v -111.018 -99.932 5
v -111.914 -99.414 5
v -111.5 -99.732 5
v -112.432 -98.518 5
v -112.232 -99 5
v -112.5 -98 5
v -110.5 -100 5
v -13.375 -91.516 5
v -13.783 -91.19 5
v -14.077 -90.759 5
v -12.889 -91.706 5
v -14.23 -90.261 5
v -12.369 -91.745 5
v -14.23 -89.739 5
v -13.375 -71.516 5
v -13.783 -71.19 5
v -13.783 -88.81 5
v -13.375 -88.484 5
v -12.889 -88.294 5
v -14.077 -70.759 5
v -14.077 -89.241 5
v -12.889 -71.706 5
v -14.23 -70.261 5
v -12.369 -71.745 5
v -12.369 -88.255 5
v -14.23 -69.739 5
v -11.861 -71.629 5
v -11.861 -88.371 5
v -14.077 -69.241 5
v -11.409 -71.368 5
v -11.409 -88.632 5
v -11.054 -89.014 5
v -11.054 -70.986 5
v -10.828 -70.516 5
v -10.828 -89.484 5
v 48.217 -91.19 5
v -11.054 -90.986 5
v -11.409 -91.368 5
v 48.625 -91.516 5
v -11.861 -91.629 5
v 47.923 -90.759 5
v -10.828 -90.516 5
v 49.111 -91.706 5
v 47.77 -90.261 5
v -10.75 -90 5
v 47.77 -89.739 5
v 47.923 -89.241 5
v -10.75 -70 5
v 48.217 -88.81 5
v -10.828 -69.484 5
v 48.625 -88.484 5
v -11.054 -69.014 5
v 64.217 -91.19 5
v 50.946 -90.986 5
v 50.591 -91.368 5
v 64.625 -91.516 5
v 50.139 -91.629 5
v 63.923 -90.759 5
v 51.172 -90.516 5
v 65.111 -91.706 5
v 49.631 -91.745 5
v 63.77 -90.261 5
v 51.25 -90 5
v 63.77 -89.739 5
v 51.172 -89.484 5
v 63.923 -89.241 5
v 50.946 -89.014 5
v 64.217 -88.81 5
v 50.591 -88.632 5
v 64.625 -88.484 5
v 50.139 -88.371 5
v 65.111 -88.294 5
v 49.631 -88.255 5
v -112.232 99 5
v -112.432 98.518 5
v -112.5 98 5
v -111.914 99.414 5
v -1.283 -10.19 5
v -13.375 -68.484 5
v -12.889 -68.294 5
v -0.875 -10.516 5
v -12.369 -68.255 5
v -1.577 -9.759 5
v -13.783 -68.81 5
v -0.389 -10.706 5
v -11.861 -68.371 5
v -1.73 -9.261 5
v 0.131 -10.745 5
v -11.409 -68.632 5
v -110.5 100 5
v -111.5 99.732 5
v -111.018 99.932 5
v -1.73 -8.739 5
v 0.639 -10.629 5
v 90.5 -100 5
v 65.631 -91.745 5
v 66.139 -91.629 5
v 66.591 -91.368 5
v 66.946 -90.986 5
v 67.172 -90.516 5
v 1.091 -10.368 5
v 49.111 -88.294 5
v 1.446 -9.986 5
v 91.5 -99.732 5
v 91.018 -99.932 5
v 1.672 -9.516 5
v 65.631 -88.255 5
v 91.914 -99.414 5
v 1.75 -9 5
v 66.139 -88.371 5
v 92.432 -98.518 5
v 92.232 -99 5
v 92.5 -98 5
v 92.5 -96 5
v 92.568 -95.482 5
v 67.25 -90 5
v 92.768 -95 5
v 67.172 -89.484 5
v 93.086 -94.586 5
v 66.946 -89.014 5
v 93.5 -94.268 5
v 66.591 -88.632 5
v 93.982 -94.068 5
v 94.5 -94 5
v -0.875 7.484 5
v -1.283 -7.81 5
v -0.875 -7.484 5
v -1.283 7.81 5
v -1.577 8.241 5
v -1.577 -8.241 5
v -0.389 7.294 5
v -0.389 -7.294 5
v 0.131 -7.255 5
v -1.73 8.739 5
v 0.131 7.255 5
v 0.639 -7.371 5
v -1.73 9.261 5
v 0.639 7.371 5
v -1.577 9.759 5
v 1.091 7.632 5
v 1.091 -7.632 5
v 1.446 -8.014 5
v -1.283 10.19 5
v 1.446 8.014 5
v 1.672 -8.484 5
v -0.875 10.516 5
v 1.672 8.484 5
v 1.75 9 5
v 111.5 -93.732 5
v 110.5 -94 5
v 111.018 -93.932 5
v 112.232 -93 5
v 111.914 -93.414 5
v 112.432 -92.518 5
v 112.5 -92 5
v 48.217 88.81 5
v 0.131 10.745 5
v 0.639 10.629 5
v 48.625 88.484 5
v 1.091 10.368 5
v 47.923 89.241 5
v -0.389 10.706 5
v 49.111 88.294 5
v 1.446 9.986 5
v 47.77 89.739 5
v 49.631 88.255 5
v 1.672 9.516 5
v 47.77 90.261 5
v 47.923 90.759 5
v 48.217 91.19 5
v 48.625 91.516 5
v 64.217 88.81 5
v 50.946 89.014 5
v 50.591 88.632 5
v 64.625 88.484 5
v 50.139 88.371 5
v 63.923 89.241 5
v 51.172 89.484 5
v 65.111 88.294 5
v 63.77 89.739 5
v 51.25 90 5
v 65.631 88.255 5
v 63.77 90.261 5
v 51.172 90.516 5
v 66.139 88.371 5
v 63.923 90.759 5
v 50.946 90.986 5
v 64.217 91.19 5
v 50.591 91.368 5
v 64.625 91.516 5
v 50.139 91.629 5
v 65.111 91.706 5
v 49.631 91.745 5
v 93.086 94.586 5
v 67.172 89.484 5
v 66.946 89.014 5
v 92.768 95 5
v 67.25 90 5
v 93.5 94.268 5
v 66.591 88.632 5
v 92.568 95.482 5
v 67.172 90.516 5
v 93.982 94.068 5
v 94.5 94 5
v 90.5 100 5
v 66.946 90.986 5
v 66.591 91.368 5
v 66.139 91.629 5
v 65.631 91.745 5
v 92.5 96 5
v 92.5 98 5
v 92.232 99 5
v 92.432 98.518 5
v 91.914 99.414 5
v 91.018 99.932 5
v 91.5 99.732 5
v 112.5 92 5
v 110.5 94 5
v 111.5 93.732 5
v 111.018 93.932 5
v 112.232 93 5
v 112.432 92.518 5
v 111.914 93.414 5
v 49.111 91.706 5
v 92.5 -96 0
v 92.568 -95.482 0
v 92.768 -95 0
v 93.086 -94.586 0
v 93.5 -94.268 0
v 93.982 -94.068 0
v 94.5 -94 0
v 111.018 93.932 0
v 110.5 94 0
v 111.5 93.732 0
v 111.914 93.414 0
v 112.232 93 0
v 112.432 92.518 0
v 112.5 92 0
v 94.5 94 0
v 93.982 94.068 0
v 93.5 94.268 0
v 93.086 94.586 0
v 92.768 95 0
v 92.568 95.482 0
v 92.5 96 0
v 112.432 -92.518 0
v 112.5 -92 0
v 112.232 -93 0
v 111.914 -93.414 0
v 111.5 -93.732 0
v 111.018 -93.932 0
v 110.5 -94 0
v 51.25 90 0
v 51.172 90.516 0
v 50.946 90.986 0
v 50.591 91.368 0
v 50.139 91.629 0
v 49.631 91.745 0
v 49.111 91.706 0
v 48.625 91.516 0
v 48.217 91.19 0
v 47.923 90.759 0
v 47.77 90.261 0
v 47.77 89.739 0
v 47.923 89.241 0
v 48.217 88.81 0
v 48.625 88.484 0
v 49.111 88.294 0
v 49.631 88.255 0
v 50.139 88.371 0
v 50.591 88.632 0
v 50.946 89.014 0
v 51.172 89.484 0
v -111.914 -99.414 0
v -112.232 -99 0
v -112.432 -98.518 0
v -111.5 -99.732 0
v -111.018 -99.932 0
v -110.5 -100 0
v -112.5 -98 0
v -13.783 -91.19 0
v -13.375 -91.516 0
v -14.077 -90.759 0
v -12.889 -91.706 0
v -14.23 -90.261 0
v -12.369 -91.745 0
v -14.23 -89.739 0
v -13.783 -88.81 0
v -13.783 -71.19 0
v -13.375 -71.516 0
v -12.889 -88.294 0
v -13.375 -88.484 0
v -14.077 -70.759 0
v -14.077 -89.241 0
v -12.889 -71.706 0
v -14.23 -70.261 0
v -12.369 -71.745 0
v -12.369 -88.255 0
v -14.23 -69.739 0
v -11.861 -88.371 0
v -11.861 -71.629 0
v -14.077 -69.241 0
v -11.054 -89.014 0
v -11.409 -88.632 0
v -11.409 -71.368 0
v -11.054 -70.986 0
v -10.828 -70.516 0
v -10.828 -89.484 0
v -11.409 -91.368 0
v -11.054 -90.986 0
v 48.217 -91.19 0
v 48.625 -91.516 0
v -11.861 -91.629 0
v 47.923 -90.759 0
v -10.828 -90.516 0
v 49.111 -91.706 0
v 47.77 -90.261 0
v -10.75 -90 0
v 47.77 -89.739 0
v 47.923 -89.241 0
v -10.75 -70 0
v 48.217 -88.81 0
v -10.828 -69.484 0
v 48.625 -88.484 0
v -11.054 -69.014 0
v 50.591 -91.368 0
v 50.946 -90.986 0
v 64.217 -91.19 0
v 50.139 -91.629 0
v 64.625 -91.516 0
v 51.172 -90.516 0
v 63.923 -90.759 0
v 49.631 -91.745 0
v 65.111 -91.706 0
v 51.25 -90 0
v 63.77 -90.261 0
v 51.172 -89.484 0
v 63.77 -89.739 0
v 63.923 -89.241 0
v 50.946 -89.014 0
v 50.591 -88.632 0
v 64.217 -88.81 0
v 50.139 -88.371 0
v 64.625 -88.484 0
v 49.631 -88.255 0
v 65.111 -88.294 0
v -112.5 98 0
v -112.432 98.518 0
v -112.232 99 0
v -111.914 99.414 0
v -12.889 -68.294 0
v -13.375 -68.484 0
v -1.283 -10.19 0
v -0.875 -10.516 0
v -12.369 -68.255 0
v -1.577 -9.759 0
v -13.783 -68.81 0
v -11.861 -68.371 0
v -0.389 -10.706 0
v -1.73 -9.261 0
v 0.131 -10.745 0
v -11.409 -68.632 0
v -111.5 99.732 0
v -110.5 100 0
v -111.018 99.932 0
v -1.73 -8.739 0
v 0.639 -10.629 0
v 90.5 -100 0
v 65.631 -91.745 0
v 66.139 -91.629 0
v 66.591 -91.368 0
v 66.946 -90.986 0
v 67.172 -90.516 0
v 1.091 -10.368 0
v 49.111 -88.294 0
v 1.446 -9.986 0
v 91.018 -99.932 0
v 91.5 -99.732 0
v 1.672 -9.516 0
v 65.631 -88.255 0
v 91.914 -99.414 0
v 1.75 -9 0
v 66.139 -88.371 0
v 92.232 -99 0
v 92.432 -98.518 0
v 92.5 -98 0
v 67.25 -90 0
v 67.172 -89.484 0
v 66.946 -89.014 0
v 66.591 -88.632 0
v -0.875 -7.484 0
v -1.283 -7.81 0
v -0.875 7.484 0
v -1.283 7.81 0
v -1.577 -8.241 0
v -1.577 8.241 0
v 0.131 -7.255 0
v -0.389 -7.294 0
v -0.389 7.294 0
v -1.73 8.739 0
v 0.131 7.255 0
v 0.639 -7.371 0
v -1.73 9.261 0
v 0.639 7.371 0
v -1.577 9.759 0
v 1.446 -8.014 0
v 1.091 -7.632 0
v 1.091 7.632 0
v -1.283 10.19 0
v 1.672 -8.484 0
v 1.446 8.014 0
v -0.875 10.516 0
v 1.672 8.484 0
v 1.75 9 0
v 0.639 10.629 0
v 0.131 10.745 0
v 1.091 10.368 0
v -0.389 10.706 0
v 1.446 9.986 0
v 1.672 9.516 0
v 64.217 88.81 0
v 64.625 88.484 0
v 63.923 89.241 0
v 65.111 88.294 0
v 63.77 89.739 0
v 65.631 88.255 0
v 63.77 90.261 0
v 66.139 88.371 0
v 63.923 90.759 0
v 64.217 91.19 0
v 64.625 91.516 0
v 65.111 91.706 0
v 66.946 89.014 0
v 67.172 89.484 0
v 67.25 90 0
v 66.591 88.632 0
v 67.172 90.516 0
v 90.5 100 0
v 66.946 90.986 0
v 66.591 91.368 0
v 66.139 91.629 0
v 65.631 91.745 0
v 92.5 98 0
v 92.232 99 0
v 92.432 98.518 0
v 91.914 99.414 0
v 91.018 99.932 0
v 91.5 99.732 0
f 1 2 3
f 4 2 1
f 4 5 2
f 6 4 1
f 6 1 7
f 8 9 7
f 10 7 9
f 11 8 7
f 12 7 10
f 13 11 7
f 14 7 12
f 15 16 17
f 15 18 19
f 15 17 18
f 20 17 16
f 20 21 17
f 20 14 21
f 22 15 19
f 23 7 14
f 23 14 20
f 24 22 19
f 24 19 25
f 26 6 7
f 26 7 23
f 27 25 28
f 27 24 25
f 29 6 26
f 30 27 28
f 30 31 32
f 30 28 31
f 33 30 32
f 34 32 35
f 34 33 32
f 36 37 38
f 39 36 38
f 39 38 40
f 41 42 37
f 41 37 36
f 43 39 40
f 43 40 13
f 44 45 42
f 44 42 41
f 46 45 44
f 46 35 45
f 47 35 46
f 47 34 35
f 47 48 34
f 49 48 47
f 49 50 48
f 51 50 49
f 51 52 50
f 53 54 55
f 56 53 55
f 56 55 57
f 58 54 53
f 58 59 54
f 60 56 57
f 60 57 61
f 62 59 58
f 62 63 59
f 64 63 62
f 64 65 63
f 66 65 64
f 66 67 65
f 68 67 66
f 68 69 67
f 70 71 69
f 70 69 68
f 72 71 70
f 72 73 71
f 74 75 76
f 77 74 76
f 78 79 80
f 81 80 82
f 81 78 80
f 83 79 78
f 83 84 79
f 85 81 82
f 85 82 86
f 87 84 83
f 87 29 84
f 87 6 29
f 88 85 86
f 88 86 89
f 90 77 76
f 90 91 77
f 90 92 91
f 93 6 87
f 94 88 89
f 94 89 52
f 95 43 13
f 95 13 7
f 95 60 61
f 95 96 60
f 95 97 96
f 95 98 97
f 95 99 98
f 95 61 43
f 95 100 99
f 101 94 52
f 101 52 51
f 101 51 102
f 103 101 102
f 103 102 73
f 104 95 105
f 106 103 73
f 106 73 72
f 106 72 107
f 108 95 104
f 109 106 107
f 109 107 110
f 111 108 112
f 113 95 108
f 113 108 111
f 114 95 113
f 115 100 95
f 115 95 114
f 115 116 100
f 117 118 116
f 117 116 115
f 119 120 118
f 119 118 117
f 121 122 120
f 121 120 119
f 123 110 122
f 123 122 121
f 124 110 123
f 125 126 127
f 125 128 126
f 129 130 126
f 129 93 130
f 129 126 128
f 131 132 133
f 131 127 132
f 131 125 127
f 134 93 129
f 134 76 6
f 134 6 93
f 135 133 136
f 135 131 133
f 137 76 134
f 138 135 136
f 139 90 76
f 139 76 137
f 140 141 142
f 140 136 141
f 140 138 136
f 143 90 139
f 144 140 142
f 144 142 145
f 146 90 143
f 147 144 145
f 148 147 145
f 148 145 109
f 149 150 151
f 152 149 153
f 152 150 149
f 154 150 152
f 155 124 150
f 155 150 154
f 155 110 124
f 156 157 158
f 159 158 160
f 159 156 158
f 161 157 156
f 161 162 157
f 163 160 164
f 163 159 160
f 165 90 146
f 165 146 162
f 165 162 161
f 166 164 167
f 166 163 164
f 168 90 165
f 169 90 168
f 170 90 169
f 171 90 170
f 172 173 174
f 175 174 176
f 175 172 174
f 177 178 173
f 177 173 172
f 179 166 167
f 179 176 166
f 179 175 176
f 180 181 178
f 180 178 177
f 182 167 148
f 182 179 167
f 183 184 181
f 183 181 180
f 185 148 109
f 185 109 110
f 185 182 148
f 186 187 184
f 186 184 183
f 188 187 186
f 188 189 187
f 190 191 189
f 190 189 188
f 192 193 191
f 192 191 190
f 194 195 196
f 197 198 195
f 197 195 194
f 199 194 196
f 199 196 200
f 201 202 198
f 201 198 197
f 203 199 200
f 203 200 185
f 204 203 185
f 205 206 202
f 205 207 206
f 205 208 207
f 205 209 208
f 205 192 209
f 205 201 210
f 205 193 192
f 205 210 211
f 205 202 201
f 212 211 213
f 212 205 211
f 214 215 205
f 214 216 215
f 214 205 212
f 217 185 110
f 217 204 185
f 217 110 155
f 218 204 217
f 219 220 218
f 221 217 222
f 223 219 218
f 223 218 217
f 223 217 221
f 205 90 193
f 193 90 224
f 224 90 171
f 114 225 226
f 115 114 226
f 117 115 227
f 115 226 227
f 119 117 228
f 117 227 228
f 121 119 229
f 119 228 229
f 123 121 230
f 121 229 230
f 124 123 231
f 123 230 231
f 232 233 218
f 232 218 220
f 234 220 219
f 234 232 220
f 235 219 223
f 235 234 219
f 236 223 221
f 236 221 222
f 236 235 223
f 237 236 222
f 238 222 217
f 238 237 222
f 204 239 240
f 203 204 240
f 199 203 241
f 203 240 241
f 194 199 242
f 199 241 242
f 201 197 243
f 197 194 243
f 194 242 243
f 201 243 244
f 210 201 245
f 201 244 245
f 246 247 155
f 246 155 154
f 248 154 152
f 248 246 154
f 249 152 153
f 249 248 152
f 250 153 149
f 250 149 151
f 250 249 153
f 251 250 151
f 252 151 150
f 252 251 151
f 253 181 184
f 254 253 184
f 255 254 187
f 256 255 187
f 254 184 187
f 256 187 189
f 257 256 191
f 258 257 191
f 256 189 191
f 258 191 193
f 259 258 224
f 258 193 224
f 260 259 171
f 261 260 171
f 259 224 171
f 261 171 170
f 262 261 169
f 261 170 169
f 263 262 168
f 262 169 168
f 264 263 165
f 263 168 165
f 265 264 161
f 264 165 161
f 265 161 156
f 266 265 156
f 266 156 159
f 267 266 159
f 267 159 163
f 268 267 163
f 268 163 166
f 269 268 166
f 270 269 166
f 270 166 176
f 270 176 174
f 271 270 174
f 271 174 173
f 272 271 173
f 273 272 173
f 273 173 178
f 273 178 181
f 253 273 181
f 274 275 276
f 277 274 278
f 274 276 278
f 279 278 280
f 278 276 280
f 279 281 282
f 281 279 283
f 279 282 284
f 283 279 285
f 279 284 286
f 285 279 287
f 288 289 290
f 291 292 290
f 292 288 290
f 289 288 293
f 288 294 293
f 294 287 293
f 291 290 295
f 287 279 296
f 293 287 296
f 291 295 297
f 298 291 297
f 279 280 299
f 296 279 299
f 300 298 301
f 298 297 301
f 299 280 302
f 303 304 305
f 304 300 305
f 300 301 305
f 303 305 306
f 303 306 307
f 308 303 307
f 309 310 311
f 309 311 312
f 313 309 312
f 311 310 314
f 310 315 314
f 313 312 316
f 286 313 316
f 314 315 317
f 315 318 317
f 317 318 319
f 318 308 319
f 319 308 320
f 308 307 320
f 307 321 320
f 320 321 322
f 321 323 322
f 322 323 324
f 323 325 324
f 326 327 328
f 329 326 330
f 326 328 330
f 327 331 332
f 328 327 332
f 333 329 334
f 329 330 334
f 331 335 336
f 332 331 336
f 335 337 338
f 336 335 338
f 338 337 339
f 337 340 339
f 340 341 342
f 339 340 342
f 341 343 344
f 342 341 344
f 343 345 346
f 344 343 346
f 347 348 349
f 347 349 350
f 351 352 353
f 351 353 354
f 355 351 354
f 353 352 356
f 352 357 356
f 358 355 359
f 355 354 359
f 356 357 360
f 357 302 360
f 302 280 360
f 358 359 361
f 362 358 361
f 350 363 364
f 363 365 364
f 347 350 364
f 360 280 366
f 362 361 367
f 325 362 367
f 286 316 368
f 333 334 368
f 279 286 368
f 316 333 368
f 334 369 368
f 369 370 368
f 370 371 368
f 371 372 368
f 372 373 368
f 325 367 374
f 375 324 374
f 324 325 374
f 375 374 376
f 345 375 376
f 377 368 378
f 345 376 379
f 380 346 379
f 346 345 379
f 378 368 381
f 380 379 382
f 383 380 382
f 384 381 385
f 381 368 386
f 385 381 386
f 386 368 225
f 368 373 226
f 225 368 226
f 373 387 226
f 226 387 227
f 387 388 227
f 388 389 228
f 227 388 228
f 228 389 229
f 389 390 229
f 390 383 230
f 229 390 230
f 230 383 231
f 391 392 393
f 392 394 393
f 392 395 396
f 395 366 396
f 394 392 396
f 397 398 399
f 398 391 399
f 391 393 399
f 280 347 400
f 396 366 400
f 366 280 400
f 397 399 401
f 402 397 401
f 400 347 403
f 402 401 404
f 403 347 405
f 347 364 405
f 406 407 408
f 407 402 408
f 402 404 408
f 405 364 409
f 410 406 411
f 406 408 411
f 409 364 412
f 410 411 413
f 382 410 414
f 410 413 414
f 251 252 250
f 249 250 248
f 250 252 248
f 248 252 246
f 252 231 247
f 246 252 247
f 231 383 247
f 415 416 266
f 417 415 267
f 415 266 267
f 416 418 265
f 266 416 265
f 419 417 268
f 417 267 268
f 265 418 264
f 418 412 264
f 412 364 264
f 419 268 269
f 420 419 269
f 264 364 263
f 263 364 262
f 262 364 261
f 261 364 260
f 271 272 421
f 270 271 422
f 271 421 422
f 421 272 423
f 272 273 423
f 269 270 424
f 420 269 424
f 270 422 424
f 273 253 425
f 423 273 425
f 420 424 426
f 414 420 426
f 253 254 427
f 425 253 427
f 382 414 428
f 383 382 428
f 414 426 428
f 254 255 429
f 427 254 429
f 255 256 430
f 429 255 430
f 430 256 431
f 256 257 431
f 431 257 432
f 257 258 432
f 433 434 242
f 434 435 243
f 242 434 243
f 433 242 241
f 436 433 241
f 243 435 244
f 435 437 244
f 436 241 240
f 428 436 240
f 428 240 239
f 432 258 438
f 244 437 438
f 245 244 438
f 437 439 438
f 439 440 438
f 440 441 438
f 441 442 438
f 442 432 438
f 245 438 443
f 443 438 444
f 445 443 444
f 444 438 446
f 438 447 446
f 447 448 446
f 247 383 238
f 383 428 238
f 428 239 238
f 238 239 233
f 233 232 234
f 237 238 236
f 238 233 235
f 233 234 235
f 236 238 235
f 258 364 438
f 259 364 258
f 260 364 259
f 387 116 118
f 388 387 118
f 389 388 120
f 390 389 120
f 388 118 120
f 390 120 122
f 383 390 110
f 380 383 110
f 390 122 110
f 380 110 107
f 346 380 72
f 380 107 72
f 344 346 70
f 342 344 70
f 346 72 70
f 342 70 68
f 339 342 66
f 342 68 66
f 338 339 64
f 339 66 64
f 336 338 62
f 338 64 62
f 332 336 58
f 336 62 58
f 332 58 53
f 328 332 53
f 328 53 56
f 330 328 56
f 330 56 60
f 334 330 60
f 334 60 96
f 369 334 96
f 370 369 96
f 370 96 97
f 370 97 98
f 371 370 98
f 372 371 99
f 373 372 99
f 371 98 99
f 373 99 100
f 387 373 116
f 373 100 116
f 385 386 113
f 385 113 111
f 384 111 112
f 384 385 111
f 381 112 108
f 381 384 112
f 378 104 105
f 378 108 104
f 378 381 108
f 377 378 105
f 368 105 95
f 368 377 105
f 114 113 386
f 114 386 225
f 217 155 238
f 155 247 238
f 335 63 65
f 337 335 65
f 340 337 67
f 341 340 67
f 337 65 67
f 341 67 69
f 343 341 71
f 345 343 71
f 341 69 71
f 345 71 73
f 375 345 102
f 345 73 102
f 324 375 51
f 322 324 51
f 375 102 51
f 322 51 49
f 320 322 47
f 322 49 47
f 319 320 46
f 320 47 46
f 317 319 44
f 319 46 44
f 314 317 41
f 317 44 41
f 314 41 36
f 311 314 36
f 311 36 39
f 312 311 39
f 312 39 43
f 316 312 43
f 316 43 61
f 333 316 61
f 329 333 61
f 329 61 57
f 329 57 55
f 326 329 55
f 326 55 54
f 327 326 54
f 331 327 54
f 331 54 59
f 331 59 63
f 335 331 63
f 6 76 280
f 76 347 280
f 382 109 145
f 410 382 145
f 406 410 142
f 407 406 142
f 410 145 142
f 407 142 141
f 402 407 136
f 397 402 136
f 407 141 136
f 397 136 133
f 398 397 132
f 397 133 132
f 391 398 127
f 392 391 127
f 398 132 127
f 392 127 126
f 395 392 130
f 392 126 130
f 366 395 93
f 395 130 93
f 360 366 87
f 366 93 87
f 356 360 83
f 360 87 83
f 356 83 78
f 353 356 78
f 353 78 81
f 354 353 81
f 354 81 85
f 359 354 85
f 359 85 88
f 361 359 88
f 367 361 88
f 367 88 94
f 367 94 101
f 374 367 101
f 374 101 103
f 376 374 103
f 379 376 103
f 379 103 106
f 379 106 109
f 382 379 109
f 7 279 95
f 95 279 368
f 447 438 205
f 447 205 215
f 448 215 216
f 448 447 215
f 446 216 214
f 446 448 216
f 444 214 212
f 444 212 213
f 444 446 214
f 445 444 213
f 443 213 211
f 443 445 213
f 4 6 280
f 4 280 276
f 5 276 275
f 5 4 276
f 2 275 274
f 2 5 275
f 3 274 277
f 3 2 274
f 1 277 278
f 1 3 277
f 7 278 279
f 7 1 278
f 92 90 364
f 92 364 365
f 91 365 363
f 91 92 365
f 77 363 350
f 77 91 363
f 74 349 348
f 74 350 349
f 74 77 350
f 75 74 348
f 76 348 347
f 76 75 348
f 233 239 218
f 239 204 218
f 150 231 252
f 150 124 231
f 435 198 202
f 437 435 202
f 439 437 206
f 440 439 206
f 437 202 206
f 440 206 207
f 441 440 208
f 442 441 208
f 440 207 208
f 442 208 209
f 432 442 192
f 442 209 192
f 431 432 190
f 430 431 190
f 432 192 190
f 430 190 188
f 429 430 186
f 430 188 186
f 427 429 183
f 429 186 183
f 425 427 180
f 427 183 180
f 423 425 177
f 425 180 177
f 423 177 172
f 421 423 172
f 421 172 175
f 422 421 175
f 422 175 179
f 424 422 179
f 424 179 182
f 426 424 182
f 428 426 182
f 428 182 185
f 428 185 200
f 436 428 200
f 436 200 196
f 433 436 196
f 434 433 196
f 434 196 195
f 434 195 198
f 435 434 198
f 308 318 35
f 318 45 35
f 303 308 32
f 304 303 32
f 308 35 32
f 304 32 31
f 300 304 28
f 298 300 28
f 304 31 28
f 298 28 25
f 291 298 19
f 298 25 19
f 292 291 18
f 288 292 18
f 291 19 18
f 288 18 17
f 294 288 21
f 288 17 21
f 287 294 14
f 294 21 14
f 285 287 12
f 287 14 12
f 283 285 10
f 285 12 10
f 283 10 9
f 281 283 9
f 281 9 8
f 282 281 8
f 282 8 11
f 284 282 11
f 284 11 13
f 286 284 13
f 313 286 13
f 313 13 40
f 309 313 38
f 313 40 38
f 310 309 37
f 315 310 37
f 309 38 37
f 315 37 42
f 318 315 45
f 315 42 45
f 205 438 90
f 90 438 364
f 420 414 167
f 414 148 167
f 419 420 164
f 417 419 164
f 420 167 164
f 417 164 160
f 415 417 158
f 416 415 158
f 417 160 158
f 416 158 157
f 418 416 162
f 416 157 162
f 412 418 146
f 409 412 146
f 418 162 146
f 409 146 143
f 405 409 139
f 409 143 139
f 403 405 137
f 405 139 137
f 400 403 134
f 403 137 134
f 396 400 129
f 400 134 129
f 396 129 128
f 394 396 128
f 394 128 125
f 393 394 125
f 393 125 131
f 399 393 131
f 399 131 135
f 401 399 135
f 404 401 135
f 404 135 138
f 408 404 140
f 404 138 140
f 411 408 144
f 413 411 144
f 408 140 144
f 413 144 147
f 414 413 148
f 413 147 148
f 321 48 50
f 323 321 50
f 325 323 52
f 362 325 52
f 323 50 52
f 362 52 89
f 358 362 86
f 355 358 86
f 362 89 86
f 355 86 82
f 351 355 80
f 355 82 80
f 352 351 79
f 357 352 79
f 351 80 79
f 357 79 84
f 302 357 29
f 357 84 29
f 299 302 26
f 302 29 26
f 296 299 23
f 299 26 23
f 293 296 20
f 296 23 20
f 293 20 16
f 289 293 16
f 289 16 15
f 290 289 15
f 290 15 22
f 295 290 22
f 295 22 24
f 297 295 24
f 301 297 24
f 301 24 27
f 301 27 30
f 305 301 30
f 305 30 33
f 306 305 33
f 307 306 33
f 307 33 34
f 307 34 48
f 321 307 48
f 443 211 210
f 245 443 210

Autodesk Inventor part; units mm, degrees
ref_plane "YZ Plane" through (0, 0, 0) normal (1, 0, 0) x (0, 1, 0)
ref_plane "XZ Plane" through (0, 0, 0) normal (0, 1, 0) x (-1, 0, 0)
ref_plane "XY Plane" through (0, 0, 0) normal (0, 0, 1) x (1, 0, 0)
sketch "Sketch1" plane through (0, 0, 0) normal (0, 0, 1) x (1, 0, 0)
  line L0 (-112.5, -100) -> (112.5, -100)
  line L1 (112.5, -100) -> (112.5, 100)
  line L2 (112.5, 100) -> (-112.5, 100)
  line L3 (-112.5, 100) -> (-112.5, -100)
  line L4 (-112.5, -100) -> (112.5, 100) construction
  line L5 (112.5, -100) -> (-112.5, 100) construction
  point P0 (0, 0)
  dimension "d0" = 225
  dimension "d1" = 200
extrude "Extrusion1" add sketch "Sketch1" along normal blind 5
sketch "Sketch2" plane through (0, 0, 5) normal (0, 0, 1) x (1, 0, 0)
  point P0 (0, 0)
sketch "Sketch3" plane through (0, 0, 5) normal (0, 0, 1) x (1, 0, 0)
  circle A0 centre (65.5, -90) radius 1.75
  circle A1 centre (49.5, -90) radius 1.75
  circle A2 centre (65.5, 90) radius 1.75
  circle A3 centre (49.5, 90) radius 1.75
  line L0 (-112.5, -100) -> (112.5, -100) projected
  line L1 (112.5, 100) -> (-112.5, 100) projected
  line L2 (112.5, -100) -> (112.5, 100) projected
  point P0 (0, 0)
  dimension "d4" = 3.5
  dimension "d5" = 3.5
  dimension "d6" = 3.5
  dimension "d7" = 3.5
  dimension "d8" = 16
  dimension "d9" = 16
  dimension "d10" = 10
  dimension "d11" = 10
  dimension "d12" = 47
  dimension "d13" = 47
extrude "Extrusion2" cut sketch "Sketch3" against normal through all
sketch "Sketch4" plane through (0, 0, 5) normal (0, 0, 1) x (1, 0, 0)
  circle A0 centre (-12.5, -90) radius 1.75
  circle A1 centre (-12.5, -70) radius 1.75
  circle A2 centre (49.5, -90) radius 1.75 projected
  line L0 (-112.5, -100) -> (112.5, -100) projected
  line L1 (-112.5, 100) -> (-112.5, -100) projected
  point P0 (0, 0)
  point P1 (-110.5, -100)
  point P2 (110.5, -100)
  point P3 (-112.5, 98)
  point P4 (-112.5, -98)
  dimension "d18" = 3.5
  dimension "d19" = 3.5
  dimension "d26" = 3.5
  dimension "d27" = 10
  dimension "d28" = 20
  dimension "d29" = 100
  dimension "d30" = 100
extrude "Extrusion3" cut sketch "Sketch4" against normal through all contours A0 | A1
sketch "Sketch5" plane through (0, 0, 5) normal (0, 0, 1) x (1, 0, 0)
  line L0 (0, -140.5799) -> (0, 140.5799) construction
  circle A0 centre (0, -9) radius 1.75
  circle A1 centre (0, 9) radius 1.75
  point P0 (0, 0)
  dimension "d31" = 3.5
  dimension "d32" = 3.5
  dimension "d33" = 9
  dimension "d34" = 9
extrude "Extrusion4" cut sketch "Sketch5" against normal through all
sketch "Sketch7" plane through (0, 0, 5) normal (0, 0, 1) x (1, 0, 0)
  line L0 (112.5, -100) -> (112.5, 100) construction
  line L1 (112.5, -100) -> (92.5, -100)
  line L2 (92.5, -100) -> (92.5, -94)
  line L3 (92.5, -94) -> (112.5, -94)
  line L4 (112.5, -94) -> (112.5, -100)
  line L5 (131.6327, 0) -> (-168.572, 0) construction
  line L6 (-112.5, -100) -> (112.5, -100) construction
  line L7 (112.5, 100) -> (-112.5, 100) projected
  line L8 (112.5, 100) -> (92.5, 100)
  line L9 (92.5, 100) -> (92.5, 94)
  line L10 (92.5, 94) -> (112.5, 94)
  line L11 (112.5, 94) -> (112.5, 100)
  point P0 (0, 0)
  dimension "d37" = 20
  dimension "d38" = 6
  dimension "d39" = 100
  dimension "d40" = 200
extrude "Extrusion5" cut sketch "Sketch7" against normal through all
fillet "Fillet2" radius 2 8 edges at (112.5, -94, 2.5) (92.5, -94, 2.5) (92.5, -100, 2.5) (112.5, 94, 2.5) (92.5, 94, 2.5) (92.5, 100, 2.5) (-112.5, 100, 2.5) (-112.5, -100, 2.5)
sketch "Sketch8" plane through (0, 0, 5) normal (0, 0, 1) x (1, 0, 0)
  arc A0 (-112.5, -98) -> (-110.5, -100) centre (-110.5, -98) ccw projected
  line L0 (-110.5, -100) -> (90.5, -100) projected
  arc A1 (90.5, -100) -> (92.5, -98) centre (90.5, -98) ccw projected
  line L1 (92.5, -98) -> (92.5, -96) projected
  arc A2 (94.5, -94) -> (92.5, -96) centre (94.5, -96) ccw projected
  line L2 (94.5, -94) -> (110.5, -94) projected
  arc A3 (110.5, -94) -> (112.5, -92) centre (110.5, -92) ccw projected
  line L3 (112.5, -92) -> (112.5, 92) projected
  arc A4 (112.5, 92) -> (110.5, 94) centre (110.5, 92) ccw projected
  line L4 (110.5, 94) -> (94.5, 94) projected
  arc A5 (92.5, 96) -> (94.5, 94) centre (94.5, 96) ccw projected
  line L5 (92.5, 96) -> (92.5, 98) projected
  arc A6 (92.5, 98) -> (90.5, 100) centre (90.5, 98) ccw projected
  line L6 (90.5, 100) -> (-110.5, 100) projected
  arc A7 (-110.5, 100) -> (-112.5, 98) centre (-110.5, 98) ccw projected
  line L7 (-112.5, 98) -> (-112.5, -98) projected
  circle A8 centre (65.5, -90) radius 1.75 projected
  circle A9 centre (49.5, 90) radius 1.75 projected
  circle A10 centre (49.5, -90) radius 1.75 projected
  circle A11 centre (65.5, 90) radius 1.75 projected
  circle A12 centre (-12.5, -70) radius 1.75 projected
  circle A13 centre (-12.5, -90) radius 1.75 projected
  circle A14 centre (0, -9) radius 1.75 projected
  circle A15 centre (0, 9) radius 1.75 projected
  point P0 (0, 0)
equation "\"d5\" = d4"
equation "\"d6\" = d4"
equation "\"d7\" = d4"
equation "\"d11\" = d10"
equation "\"d13\" = d12"
equation "\"d19\" = d18"
equation "\"d26\" = d19"
equation "\"d30\" = d29"
equation "\"d32\" = d31"
equation "\"d34\" = d33"
equation "\"d39\" = 0.5 * d40"
properties part number "BottomAcrylicSheet"
